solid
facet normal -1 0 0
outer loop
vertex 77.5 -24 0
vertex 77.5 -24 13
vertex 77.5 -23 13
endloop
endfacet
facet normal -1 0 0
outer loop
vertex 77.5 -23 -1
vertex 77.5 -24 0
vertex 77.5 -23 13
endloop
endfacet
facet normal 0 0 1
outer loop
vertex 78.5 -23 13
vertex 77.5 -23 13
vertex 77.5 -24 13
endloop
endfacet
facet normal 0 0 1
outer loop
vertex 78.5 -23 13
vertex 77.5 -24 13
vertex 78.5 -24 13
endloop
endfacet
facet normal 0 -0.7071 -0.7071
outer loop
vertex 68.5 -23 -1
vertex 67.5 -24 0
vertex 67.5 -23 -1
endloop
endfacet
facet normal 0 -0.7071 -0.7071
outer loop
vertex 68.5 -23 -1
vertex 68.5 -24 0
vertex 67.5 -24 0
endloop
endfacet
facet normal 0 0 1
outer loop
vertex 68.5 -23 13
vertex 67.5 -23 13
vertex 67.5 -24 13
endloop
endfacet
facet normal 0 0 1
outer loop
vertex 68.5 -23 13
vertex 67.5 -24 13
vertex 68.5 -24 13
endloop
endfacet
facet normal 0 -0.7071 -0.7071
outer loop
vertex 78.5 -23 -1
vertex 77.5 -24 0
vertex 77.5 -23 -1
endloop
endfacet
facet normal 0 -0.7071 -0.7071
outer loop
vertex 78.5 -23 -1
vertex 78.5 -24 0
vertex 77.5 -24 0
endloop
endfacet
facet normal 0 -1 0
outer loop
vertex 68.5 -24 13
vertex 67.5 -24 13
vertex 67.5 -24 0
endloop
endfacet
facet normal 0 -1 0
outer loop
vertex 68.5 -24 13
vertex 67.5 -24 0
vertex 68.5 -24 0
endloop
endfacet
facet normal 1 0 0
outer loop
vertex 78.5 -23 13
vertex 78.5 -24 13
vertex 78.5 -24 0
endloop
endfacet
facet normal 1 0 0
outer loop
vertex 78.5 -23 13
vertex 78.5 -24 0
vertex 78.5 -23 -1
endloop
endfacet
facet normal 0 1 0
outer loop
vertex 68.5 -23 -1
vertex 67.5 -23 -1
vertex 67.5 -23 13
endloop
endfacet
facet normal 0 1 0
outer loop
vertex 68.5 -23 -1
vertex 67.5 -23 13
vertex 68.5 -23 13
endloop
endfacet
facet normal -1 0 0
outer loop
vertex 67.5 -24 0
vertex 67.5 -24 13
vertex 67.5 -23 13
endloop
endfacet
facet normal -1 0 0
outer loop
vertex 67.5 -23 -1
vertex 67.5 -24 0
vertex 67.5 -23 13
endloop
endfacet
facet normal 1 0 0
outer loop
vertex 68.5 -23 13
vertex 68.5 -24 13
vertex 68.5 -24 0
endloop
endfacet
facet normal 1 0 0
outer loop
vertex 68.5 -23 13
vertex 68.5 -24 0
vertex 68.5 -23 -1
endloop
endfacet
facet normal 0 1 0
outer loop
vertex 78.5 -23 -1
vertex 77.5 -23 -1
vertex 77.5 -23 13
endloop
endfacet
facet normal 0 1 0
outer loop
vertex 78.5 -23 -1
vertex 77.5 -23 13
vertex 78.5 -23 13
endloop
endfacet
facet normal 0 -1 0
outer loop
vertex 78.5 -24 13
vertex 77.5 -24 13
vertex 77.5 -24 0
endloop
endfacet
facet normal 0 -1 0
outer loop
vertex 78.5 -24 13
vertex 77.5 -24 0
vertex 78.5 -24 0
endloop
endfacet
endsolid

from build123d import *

# Parameters (mm, degrees)
EXTRUDE023_DEPTH = 20
SKETCH019_W      = 1
SKETCH019_H      = 1
EXTRUDE019_DEPTH = 14


with BuildPart() as extrude023:
    # Sketch027 → Extrude023 (new body)
    with BuildSketch(Plane.YZ.offset(84)):
        Polygon((-25, 1), (-22, -2), (-25, -2), align=None)
    extrude(amount=-EXTRUDE023_DEPTH)


with BuildPart() as cut004:
    # Sketch019 → Extrude019 (new body)
    with BuildSketch(Plane.XY.offset(-1)):
        with Locations((68, -23.5)):
            Rectangle(SKETCH019_W, SKETCH019_H)
        with Locations((78, -23.5)):
            Rectangle(SKETCH019_W, SKETCH019_H)
    extrude(amount=EXTRUDE019_DEPTH)

    # Cut004: cut Extrude023
    add(extrude023.part, mode=Mode.SUBTRACT)


solid = cut004.part
